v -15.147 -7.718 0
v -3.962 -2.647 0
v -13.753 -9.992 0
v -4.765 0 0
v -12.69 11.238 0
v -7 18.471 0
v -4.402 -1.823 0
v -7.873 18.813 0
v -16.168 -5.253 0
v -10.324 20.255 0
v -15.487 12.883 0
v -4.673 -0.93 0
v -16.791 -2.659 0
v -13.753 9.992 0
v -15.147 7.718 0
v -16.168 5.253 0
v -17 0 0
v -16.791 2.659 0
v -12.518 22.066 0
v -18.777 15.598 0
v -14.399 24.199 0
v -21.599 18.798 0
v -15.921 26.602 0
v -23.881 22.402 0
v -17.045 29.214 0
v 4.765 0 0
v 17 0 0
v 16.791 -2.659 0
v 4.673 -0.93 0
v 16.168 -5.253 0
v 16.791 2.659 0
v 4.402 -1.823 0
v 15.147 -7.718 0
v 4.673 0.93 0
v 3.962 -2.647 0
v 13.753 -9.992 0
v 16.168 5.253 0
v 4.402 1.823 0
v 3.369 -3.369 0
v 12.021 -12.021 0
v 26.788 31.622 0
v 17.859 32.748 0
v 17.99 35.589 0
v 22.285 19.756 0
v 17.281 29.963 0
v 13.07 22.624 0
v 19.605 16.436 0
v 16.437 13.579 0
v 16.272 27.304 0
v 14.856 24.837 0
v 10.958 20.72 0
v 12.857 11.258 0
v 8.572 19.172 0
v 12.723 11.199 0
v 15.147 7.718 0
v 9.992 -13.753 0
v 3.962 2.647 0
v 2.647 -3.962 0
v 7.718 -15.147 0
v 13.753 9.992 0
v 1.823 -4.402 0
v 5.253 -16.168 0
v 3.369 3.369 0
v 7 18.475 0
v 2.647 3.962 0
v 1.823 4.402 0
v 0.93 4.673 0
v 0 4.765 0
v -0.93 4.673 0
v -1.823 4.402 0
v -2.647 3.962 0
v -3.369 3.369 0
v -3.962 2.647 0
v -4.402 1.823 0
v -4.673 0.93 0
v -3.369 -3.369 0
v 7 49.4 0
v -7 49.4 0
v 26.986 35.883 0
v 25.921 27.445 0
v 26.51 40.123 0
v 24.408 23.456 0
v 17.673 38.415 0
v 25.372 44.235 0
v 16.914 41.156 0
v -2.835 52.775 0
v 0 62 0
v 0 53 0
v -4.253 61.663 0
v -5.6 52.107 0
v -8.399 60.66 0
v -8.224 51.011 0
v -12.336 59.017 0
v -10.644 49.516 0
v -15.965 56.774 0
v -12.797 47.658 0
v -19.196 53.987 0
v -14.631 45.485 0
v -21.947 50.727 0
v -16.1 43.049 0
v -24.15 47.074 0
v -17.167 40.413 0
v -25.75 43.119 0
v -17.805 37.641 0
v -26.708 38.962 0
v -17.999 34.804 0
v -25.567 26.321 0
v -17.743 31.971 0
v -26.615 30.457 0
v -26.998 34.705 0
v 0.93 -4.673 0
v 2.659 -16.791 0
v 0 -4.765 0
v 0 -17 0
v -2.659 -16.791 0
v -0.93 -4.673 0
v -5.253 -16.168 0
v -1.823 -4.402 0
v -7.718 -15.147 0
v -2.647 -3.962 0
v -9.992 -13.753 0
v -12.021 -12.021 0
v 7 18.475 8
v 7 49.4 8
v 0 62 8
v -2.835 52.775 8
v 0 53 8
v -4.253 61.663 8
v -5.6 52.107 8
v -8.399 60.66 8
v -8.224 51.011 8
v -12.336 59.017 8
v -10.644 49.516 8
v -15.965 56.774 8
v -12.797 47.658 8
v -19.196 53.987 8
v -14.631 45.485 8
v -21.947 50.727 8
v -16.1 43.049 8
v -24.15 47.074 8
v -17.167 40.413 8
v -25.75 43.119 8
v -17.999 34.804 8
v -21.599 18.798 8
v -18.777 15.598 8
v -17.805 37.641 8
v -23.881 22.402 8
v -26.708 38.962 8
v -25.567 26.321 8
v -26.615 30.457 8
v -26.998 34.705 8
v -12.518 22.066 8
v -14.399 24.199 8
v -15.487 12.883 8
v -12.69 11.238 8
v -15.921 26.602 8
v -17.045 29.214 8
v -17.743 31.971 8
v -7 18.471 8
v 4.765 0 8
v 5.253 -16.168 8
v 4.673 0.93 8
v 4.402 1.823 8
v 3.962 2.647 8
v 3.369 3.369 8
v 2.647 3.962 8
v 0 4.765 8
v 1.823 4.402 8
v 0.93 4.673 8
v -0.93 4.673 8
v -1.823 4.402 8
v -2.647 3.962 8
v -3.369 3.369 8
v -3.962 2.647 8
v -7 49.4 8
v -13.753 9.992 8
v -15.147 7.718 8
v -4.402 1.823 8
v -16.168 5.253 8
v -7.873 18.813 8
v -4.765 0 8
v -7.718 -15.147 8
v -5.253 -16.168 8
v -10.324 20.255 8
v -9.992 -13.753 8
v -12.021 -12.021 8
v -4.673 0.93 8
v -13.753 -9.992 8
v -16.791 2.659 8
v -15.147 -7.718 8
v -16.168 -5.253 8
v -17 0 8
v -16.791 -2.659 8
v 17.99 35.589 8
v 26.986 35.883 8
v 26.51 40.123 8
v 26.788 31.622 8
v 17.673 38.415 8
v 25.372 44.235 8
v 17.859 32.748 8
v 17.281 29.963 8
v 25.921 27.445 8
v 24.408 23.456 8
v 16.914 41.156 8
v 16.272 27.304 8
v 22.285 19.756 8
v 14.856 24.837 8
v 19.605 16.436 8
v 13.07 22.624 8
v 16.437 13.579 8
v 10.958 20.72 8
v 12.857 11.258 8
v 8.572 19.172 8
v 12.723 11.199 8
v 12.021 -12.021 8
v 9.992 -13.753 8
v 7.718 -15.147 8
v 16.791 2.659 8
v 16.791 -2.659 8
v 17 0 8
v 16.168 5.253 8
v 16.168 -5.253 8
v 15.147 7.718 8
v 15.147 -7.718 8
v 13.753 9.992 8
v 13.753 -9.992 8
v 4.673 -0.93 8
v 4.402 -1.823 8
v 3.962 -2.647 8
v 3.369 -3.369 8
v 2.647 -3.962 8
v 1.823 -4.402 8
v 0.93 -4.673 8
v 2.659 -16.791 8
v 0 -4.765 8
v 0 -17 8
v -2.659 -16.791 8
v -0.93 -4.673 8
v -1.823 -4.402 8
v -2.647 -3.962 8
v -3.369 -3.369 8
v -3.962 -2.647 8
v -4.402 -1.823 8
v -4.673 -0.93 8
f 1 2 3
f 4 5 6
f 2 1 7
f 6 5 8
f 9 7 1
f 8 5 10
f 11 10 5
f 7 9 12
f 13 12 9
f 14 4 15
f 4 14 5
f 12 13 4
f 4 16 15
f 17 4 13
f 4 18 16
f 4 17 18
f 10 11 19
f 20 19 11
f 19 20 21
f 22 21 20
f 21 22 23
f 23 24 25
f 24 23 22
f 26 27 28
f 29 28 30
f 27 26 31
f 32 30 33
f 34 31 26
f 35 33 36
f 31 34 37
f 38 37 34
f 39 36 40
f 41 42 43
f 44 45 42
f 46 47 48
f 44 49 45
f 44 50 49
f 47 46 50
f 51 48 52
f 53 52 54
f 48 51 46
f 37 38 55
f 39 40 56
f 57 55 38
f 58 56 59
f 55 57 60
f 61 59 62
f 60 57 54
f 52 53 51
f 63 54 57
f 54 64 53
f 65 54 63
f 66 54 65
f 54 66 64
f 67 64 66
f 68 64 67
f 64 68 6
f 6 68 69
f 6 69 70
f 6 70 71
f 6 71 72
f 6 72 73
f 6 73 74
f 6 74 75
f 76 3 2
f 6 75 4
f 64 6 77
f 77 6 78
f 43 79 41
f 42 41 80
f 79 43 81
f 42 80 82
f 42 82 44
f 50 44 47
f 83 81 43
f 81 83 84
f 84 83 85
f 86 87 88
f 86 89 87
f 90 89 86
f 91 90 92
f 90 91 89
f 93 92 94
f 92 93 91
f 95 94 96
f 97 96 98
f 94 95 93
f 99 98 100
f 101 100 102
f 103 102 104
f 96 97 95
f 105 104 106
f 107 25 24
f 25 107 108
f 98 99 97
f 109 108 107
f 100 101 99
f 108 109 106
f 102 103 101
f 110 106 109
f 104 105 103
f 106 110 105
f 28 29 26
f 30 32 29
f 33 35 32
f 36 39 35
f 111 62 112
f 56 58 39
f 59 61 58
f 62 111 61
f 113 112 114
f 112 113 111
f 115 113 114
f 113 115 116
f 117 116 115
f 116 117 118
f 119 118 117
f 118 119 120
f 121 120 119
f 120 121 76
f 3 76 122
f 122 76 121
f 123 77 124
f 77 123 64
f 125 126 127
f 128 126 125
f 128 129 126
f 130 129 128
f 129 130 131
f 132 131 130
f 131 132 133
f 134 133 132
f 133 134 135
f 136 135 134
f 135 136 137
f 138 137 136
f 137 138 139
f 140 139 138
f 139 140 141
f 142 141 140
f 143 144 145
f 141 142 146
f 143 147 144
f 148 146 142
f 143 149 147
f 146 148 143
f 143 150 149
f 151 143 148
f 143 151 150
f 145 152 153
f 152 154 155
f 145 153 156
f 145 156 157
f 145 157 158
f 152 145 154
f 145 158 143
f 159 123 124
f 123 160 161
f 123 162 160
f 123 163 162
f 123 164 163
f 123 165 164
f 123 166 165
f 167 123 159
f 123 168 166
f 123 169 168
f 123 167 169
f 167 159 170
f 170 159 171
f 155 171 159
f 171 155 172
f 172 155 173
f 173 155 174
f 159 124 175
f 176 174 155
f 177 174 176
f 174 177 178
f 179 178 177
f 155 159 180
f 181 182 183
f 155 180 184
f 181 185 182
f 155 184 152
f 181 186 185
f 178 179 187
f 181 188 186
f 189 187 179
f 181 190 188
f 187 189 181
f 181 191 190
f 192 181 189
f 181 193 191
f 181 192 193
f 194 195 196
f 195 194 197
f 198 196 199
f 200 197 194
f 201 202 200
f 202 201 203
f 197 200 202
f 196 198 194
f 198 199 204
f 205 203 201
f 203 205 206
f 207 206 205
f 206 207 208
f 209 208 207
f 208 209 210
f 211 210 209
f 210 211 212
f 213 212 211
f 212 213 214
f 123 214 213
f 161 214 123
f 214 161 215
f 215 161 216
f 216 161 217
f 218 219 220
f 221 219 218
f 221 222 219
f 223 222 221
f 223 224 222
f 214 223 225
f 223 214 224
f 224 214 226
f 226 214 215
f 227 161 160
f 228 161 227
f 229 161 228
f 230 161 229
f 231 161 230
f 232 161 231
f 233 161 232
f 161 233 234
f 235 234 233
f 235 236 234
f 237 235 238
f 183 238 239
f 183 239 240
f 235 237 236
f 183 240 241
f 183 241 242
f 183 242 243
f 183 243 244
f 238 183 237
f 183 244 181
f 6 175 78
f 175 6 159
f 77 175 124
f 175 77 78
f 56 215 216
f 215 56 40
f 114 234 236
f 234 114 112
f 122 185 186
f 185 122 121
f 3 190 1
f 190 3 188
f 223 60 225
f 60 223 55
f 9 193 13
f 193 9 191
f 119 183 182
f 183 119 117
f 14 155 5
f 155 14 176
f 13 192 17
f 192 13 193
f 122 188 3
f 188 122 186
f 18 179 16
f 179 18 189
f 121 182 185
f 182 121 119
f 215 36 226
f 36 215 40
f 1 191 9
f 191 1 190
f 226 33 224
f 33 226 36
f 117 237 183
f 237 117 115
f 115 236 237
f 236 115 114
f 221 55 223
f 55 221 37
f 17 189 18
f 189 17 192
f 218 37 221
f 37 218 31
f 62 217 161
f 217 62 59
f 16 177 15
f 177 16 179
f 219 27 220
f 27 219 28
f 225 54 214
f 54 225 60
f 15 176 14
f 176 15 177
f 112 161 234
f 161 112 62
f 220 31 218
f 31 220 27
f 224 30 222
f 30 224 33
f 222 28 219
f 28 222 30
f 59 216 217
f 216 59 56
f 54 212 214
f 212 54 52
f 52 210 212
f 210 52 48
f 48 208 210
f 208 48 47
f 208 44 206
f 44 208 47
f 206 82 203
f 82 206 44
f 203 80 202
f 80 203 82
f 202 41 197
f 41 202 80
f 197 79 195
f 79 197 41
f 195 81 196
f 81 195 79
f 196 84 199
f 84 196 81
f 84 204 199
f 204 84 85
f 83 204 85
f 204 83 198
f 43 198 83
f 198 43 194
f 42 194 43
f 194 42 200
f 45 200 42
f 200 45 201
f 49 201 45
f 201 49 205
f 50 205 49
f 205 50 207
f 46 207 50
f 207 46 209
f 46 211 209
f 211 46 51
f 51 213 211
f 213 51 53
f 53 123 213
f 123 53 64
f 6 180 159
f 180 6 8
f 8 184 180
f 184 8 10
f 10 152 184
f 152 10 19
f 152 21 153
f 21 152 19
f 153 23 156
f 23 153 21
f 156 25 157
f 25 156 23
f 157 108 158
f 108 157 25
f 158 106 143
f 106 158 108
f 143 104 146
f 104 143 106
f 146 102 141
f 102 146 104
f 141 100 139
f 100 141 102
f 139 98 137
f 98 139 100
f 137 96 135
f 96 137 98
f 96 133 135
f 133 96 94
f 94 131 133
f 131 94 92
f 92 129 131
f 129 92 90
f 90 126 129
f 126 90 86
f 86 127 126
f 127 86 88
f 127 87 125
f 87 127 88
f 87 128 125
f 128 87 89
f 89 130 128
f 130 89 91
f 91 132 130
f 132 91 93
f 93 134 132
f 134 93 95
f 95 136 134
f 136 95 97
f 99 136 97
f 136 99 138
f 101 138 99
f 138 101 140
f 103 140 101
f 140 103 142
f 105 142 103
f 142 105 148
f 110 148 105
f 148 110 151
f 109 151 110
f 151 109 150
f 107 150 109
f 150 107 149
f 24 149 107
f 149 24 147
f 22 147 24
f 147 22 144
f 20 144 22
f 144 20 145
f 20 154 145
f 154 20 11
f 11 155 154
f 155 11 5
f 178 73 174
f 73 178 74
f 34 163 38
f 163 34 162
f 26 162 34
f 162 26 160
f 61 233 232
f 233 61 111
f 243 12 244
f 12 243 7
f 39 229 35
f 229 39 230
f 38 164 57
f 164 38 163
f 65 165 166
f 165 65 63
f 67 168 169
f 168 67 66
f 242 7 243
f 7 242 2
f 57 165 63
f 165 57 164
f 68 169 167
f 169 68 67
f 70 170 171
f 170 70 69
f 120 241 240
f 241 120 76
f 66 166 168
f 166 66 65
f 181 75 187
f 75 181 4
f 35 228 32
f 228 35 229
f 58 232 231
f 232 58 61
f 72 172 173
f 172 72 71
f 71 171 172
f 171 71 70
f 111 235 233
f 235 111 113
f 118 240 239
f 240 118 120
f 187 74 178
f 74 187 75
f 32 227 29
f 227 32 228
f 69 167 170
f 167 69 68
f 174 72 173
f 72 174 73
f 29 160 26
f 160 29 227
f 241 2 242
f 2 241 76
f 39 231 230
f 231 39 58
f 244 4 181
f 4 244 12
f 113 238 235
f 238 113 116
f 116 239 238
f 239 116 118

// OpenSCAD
$fn = 32;

// ----------------------------------------------------------------------
// Hook: 70 mm shank into a 18 mm curl, 8 mm thick
// ----------------------------------------------------------------------

// --- parameters (mm) ---
shank_len = 70;           // shank length from the boss centre
shank_w = 14;             // shank width
boss_d = 34;              // boss diameter
bore_d = 9.53;            // boss bore
curl_in = 18;             // curl inner radius
curl_out = 27;            // curl outer radius
curl_sweep = 290;         // curl sweep angle
hook_t = 8;               // hook thickness

shank_profile = [[-7, 49.4], [7, 49.4], [7, 15], [-7, 15]];
boss_profile = [[17, 0], [16.791, 2.659], [16.168, 5.253], [15.147, 7.718], [13.753, 9.992], [12.021, 12.021], [9.992, 13.753], [7.718, 15.147], [5.253, 16.168], [2.659, 16.791], [0, 17], [-2.659, 16.791], [-5.253, 16.168], [-7.718, 15.147], [-9.992, 13.753], [-12.021, 12.021], [-13.753, 9.992], [-15.147, 7.718], [-16.168, 5.253], [-16.791, 2.659], [-17, 0], [-16.791, -2.659], [-16.168, -5.253], [-15.147, -7.718], [-13.753, -9.992], [-12.021, -12.021], [-9.992, -13.753], [-7.718, -15.147], [-5.253, -16.168], [-2.659, -16.791], [0, -17], [2.659, -16.791], [5.253, -16.168], [7.718, -15.147], [9.992, -13.753], [12.021, -12.021], [13.753, -9.992], [15.147, -7.718], [16.168, -5.253], [16.791, -2.659]];
curl_profile = [[0, 62], [-4.253, 61.663], [-8.399, 60.66], [-12.336, 59.017], [-15.965, 56.774], [-19.196, 53.987], [-21.947, 50.727], [-24.15, 47.074], [-25.75, 43.119], [-26.708, 38.962], [-26.998, 34.705], [-26.615, 30.457], [-25.567, 26.321], [-23.881, 22.402], [-21.599, 18.798], [-18.777, 15.598], [-15.487, 12.883], [-11.81, 10.72], [-7.838, 9.163], [-3.67, 8.251], [0.589, 8.006], [4.833, 8.436], [8.957, 9.529], [12.857, 11.258], [16.437, 13.579], [19.605, 16.436], [22.285, 19.756], [24.408, 23.456], [25.921, 27.445], [26.788, 31.622], [26.986, 35.883], [26.51, 40.123], [25.372, 44.235], [16.914, 41.156], [17.673, 38.415], [17.99, 35.589], [17.859, 32.748], [17.281, 29.963], [16.272, 27.304], [14.856, 24.837], [13.07, 22.624], [10.958, 20.72], [8.572, 19.172], [5.971, 18.019], [3.222, 17.291], [0.393, 17.004], [-2.447, 17.167], [-5.225, 17.775], [-7.873, 18.813], [-10.324, 20.255], [-12.518, 22.066], [-14.399, 24.199], [-15.921, 26.602], [-17.045, 29.214], [-17.743, 31.971], [-17.999, 34.804], [-17.805, 37.641], [-17.167, 40.413], [-16.1, 43.049], [-14.631, 45.485], [-12.797, 47.658], [-10.644, 49.516], [-8.224, 51.011], [-5.6, 52.107], [-2.835, 52.775], [0, 53]];

difference() {
  union() {
    /* three overlapping outlines: shank, boss and the smooth curl */
    linear_extrude(height = hook_t) polygon(shank_profile);
    linear_extrude(height = hook_t) polygon(boss_profile);
    linear_extrude(height = hook_t) polygon(curl_profile);
  }
  translate([0, 0, -2.5]) cylinder(h = hook_t + 5, d = bore_d);
}
